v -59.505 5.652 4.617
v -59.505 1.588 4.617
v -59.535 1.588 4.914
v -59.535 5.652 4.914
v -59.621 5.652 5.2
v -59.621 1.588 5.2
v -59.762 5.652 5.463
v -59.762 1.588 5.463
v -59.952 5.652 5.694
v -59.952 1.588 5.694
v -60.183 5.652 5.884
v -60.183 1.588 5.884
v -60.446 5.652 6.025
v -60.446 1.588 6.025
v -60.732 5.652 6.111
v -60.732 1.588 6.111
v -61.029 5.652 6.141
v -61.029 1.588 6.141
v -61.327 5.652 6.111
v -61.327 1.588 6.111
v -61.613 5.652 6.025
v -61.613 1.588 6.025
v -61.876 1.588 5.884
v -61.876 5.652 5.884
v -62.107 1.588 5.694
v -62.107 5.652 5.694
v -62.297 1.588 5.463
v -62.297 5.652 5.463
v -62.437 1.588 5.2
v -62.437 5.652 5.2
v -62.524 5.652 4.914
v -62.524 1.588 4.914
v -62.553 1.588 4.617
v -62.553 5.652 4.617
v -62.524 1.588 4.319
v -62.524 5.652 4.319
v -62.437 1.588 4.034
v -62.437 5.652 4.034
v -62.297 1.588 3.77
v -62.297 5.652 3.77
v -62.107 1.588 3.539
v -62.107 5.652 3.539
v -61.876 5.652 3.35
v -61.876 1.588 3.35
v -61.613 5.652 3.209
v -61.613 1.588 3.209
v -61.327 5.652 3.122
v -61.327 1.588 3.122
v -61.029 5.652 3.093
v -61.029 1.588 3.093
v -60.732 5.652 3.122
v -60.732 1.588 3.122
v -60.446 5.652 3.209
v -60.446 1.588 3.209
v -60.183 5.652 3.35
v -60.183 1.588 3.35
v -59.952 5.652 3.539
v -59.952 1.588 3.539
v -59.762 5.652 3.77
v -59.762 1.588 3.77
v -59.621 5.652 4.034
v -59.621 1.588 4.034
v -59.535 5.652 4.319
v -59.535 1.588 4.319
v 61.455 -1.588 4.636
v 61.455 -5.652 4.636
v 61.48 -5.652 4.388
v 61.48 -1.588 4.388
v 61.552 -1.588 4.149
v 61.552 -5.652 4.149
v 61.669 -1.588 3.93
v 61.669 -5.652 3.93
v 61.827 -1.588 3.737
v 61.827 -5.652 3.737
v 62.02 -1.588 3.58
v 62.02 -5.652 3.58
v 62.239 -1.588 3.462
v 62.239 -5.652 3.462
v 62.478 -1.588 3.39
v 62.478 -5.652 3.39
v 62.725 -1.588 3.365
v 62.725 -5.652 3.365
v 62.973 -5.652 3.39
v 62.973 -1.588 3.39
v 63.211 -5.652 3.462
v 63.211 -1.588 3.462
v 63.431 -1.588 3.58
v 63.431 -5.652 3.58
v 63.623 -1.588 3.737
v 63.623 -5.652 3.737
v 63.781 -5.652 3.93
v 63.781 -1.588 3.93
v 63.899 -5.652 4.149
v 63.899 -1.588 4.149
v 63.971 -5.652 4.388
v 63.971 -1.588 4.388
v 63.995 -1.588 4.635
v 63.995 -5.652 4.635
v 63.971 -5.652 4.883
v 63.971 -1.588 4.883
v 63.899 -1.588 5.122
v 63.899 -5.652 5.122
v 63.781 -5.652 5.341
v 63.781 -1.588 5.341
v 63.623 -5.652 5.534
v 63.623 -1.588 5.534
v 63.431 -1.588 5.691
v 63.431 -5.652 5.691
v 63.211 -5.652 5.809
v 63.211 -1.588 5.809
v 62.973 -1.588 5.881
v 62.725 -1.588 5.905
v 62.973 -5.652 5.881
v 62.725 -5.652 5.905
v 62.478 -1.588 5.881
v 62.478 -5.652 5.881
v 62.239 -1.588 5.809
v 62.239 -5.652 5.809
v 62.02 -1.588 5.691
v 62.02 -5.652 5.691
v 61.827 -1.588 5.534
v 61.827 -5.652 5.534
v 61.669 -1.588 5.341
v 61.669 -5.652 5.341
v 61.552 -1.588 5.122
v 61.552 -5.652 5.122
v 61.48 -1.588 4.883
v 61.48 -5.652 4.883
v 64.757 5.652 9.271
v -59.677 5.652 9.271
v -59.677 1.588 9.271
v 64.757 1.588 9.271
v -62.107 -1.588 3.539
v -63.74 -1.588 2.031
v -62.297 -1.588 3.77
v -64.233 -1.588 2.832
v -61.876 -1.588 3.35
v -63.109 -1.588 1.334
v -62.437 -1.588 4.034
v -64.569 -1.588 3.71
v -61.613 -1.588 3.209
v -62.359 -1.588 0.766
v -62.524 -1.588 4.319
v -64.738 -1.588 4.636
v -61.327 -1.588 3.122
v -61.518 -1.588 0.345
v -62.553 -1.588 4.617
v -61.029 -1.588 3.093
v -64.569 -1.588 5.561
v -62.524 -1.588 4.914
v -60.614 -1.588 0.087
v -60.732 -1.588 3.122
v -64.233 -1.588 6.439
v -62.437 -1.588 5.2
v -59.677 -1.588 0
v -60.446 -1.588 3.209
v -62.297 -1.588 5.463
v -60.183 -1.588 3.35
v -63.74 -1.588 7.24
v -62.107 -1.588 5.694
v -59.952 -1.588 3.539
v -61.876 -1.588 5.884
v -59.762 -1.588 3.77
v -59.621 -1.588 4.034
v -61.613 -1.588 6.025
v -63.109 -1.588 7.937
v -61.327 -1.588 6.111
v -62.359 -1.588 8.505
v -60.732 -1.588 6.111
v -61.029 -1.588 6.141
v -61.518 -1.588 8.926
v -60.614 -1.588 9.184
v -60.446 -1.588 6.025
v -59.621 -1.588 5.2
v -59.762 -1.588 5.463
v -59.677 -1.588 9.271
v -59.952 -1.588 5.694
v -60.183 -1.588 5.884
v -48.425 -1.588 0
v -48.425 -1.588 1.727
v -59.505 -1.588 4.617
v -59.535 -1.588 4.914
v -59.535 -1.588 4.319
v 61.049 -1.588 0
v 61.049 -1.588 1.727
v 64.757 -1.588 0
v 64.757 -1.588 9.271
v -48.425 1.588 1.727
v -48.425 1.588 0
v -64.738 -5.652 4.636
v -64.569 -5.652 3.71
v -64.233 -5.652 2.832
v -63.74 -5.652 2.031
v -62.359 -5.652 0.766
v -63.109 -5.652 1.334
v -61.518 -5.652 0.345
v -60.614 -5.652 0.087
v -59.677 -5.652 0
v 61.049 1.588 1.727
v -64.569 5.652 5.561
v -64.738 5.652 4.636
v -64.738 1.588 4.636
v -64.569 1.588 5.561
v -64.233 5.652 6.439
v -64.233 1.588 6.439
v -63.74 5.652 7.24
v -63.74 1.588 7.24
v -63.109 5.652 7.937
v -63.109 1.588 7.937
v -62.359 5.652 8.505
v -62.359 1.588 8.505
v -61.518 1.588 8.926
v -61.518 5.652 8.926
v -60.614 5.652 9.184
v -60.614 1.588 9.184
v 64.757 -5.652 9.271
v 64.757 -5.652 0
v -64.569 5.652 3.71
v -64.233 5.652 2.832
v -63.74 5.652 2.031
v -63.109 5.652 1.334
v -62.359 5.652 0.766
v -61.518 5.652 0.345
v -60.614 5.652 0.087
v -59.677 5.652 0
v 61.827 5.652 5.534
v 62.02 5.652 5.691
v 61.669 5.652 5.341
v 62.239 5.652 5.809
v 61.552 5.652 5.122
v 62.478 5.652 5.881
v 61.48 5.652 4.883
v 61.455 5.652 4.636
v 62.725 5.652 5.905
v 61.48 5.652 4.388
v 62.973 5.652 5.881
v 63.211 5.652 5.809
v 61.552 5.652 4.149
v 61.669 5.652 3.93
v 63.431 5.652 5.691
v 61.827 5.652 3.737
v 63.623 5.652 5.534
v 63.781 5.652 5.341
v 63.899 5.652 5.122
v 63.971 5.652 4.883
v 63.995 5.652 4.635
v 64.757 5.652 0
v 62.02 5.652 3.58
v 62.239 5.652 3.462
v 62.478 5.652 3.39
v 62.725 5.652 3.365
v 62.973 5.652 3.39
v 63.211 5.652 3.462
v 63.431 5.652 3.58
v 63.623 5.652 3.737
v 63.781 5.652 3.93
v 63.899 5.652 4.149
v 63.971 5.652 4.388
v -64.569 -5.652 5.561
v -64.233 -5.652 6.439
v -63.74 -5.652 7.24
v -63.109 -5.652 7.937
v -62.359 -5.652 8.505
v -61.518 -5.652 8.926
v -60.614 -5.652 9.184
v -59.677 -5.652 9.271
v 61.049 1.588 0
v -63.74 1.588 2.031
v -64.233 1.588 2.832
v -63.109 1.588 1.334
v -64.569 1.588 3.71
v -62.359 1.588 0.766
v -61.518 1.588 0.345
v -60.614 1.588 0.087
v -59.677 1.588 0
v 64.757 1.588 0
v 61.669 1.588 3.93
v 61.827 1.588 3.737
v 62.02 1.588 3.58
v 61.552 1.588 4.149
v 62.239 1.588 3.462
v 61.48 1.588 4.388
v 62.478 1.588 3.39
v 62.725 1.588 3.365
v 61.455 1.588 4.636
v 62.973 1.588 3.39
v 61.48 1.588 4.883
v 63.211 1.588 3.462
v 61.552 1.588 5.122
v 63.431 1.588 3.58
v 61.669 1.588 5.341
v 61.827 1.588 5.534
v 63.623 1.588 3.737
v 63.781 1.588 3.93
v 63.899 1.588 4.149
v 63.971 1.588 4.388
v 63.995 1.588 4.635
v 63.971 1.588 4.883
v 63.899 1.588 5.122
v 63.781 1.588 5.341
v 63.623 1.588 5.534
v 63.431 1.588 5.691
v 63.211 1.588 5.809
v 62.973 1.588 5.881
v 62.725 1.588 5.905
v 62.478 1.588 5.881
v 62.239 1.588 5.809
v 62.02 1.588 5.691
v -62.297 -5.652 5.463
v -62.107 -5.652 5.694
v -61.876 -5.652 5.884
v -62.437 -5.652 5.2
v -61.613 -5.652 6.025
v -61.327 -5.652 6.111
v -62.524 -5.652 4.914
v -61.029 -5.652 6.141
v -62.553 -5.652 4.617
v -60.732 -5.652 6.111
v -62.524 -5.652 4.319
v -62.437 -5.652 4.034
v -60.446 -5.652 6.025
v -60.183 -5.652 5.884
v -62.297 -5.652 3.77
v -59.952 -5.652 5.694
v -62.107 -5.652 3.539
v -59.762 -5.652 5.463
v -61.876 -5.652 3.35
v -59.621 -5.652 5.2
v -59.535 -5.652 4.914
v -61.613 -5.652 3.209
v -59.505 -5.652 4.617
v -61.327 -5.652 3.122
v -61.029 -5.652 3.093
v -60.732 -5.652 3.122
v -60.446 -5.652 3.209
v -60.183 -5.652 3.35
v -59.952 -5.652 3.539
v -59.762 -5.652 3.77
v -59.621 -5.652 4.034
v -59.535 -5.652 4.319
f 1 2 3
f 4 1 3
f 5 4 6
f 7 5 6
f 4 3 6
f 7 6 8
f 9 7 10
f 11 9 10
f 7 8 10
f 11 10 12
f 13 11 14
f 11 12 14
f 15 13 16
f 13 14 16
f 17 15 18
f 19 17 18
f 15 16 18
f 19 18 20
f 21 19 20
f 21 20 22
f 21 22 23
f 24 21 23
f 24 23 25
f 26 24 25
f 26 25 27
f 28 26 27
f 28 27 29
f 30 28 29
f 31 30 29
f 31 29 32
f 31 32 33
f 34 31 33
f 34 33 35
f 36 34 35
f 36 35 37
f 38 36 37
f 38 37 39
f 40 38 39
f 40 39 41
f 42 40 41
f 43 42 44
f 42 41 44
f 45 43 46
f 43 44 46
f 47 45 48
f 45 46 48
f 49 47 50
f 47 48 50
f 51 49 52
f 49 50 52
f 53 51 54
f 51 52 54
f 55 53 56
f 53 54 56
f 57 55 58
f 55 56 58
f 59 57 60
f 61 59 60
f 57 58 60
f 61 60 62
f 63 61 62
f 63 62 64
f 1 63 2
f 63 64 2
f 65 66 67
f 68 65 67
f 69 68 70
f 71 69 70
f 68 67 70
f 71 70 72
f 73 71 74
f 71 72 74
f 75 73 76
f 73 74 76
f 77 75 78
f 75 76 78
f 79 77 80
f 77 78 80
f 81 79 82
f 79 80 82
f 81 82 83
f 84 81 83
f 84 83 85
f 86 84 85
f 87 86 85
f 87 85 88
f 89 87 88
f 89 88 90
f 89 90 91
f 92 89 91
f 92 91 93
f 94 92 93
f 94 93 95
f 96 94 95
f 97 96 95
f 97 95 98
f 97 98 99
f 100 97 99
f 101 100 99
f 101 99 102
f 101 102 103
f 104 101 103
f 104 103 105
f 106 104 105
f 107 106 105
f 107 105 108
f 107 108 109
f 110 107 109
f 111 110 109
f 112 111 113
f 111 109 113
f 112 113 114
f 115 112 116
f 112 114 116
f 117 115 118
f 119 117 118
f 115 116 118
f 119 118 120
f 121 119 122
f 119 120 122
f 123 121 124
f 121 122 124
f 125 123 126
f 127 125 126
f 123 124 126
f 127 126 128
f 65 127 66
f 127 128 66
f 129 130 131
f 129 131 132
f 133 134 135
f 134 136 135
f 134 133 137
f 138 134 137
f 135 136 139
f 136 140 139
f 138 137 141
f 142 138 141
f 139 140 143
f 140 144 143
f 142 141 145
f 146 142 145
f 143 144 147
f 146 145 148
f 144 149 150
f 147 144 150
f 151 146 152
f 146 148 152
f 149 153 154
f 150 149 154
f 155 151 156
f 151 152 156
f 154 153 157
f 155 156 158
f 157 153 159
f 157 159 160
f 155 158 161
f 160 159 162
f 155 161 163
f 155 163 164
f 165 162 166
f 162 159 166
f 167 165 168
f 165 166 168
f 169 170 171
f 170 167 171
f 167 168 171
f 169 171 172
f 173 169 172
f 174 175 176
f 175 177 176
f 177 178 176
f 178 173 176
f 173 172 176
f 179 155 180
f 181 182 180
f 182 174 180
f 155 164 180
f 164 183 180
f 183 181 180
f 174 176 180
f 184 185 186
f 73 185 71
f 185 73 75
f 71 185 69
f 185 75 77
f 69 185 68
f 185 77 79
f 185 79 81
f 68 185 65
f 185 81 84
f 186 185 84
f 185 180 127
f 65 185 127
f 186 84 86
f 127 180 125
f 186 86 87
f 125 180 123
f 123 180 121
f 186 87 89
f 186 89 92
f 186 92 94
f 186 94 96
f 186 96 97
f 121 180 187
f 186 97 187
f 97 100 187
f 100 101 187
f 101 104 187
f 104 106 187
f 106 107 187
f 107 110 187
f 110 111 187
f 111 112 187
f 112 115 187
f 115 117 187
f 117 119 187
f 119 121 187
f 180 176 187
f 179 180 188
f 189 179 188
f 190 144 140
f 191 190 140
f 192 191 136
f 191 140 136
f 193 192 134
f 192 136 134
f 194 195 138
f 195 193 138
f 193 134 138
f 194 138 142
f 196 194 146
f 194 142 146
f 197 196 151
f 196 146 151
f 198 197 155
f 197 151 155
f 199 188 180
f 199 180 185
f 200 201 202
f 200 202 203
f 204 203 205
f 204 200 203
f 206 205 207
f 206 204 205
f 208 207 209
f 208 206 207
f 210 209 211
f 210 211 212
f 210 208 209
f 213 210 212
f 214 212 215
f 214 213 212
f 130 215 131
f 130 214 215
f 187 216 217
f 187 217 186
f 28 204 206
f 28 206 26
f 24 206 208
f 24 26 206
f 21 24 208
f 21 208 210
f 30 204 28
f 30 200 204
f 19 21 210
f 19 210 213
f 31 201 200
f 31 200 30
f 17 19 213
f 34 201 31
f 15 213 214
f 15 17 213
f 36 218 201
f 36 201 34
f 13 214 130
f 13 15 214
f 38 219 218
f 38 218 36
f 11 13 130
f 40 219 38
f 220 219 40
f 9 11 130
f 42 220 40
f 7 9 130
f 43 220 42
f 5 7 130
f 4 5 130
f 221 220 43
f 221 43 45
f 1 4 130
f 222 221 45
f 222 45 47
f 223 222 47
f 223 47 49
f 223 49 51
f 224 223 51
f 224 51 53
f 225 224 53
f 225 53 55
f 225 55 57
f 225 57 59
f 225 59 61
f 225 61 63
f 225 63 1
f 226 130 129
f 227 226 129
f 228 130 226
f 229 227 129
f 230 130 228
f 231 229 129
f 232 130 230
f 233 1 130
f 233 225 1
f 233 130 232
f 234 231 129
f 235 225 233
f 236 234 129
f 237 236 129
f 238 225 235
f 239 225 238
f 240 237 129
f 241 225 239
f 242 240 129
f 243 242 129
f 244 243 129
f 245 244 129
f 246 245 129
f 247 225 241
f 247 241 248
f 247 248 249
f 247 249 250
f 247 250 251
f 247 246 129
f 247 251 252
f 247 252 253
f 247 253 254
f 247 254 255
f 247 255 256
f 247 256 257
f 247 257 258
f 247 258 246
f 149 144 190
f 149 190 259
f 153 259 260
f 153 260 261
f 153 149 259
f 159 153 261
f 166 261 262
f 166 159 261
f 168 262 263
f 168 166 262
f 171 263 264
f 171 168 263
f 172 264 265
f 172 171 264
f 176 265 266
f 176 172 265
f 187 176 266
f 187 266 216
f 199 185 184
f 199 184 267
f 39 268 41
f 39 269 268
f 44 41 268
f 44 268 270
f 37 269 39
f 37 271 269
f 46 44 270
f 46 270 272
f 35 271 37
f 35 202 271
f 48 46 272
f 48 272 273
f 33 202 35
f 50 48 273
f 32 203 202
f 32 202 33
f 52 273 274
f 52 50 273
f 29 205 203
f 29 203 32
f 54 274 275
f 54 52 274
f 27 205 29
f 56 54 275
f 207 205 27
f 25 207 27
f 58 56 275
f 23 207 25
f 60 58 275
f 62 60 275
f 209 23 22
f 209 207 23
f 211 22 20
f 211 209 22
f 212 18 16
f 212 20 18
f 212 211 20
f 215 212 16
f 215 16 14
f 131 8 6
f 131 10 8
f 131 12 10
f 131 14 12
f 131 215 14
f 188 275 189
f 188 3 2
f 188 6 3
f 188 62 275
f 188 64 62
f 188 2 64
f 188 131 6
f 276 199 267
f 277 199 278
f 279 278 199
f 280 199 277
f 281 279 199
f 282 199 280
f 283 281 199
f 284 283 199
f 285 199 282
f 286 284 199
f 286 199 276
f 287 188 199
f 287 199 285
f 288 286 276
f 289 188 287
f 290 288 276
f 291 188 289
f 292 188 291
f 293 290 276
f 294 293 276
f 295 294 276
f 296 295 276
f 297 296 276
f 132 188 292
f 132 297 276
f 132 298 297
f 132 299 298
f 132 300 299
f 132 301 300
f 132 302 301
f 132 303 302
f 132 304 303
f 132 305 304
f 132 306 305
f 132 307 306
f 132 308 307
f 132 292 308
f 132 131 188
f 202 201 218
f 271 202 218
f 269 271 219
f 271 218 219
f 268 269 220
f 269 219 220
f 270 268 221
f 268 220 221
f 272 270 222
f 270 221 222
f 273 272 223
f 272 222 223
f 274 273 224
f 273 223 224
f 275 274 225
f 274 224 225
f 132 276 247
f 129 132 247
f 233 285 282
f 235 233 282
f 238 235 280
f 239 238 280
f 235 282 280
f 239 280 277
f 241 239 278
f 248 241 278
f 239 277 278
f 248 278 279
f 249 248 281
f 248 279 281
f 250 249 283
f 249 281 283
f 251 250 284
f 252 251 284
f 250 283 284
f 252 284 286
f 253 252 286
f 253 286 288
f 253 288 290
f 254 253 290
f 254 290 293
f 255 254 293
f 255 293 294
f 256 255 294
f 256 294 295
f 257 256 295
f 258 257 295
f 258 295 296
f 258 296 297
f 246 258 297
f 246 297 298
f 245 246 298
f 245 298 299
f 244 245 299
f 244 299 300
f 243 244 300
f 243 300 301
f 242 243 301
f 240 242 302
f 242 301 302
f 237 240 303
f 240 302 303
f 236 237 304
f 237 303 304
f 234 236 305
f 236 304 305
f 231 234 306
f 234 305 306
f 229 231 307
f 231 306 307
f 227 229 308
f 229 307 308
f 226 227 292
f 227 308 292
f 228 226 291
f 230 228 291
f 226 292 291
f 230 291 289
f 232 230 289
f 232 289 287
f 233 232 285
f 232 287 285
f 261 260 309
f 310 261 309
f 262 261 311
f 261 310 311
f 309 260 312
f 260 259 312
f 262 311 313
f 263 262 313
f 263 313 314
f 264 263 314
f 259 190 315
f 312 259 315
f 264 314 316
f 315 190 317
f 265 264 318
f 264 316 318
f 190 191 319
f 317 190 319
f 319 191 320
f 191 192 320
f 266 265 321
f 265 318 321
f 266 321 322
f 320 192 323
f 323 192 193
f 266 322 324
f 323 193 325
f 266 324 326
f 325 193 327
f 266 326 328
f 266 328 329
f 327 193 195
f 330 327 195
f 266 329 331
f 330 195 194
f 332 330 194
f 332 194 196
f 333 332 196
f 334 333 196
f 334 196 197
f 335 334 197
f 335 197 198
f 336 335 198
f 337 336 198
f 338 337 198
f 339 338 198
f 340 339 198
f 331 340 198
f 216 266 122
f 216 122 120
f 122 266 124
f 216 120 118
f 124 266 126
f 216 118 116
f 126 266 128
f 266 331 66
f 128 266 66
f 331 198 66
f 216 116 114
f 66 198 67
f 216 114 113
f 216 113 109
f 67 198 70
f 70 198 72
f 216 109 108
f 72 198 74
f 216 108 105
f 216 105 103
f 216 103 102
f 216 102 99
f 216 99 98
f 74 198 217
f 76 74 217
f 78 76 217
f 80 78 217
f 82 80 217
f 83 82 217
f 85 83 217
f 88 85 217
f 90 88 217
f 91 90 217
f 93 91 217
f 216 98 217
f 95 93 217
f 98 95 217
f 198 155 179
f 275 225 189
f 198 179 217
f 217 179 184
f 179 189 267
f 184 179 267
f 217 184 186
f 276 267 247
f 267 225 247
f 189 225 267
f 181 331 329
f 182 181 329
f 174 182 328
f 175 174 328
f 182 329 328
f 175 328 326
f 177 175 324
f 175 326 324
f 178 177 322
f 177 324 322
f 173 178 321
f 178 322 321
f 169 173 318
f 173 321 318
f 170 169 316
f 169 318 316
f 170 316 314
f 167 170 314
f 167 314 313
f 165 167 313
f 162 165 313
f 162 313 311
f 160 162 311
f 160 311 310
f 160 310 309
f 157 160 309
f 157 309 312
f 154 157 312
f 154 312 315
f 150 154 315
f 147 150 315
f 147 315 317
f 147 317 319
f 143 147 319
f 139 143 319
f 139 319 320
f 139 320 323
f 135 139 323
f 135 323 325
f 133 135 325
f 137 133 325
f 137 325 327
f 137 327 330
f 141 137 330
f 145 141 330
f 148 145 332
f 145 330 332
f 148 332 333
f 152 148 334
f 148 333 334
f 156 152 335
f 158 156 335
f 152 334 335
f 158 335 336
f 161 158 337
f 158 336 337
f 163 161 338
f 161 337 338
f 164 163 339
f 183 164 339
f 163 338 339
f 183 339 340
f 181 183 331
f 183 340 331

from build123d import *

# Parameters (mm, degrees)
F0_W        = 129.5146
F0_H        = 11.303
F1_DEPTH    = 9.271
F2_W        = 206.3660303733
F2_H        = 3.175
F3_DEPTH    = 7.5438
F4_W        = 3.7084
F4_H        = 3.175
F5_DEPTH    = 25.4
F6_W        = 16.3322
F6_H        = 3.175
F7_DEPTH    = 25.4
F8_T1_DEPTH = 29.464
F8_T3_DEPTH = 29.464
F9_R        = 1.524
F10_DEPTH   = 25.4
F12_DEPTH   = 25.4
F13_W       = 11.2141259015
F13_H       = 1.2269735361
F14_DEPTH   = 4.1656
F15_DEPTH   = 0.254
F16_DEPTH   = 3.175
F16_FACE_W  = 4.4019735361
F16_FACE_H  = 4.1656
F17_ANGLE   = 90


# Not quite as in the source:
# - a fillet or chamfer that OpenCascade refuses, or shapes differently, is made with other operations: its cross-section is extruded or revolved along the edge and cut away or added


with BuildPart() as f1:
    # F0 (on Top) → F1 (new body)
    with BuildSketch(Plane.XY):
        Rectangle(F0_W, F0_H)
    extrude(amount=F1_DEPTH)

    # F2 (on face) → F3 (cut)
    with BuildSketch(Plane.XY.offset(9.271)):
        Rectangle(F2_W, F2_H)
    extrude(amount=-F3_DEPTH, mode=Mode.SUBTRACT)

    # F4 (on face) → F5 (cut)
    with BuildSketch(Plane.XY.offset(1.7272)):
        with Locations((62.9031, 0)):
            Rectangle(F4_W, F4_H)
    extrude(amount=-F5_DEPTH, mode=Mode.SUBTRACT)

    # F6 (on face) → F7 (cut)
    with BuildSketch(Plane.XY.offset(1.7272)):
        with Locations((-56.5912, 0)):
            Rectangle(F6_W, F6_H)
    extrude(amount=-F7_DEPTH, mode=Mode.SUBTRACT)

    # F8: fillet of radius 5.08 on 4 edges, made by hand

    # F8_s2 → F8_t1 (cut)
    with BuildSketch(Plane.XZ.offset(-11.1125)):
        with BuildLine():
            ThreePointArc((-64.7573, 4.191), (-63.2694024484, 7.7831024484), (-59.6773, 9.271))
            Line((-59.6773, 9.271), (-64.7573, 9.271))
            Line((-64.7573, 9.271), (-64.7573, 4.191))
        make_face()
        with BuildLine():
            ThreePointArc((-64.7573, 5.08), (-63.2694024484, 1.4878975516), (-59.6773, 0))
            Line((-59.6773, 0), (-64.7573, 0))
            Line((-64.7573, 0), (-64.7573, 5.08))
        make_face()
    extrude(amount=F8_T1_DEPTH, mode=Mode.SUBTRACT)

    # F8_s4 → F8_t3 (cut)
    with BuildSketch(Plane.XZ.offset(-18.3515)):
        with BuildLine():
            ThreePointArc((-59.6773, 9.271), (-63.2694024484, 7.7831024484), (-64.7573, 4.191))
            Line((-64.7573, 4.191), (-64.7573, 9.271))
            Line((-64.7573, 9.271), (-59.6773, 9.271))
        make_face()
        with BuildLine():
            ThreePointArc((-64.7573, 5.08), (-63.2694024484, 1.4878975516), (-59.6773, 0))
            Line((-59.6773, 0), (-64.7573, 0))
            Line((-64.7573, 0), (-64.7573, 5.08))
        make_face()
    extrude(amount=F8_T3_DEPTH, mode=Mode.SUBTRACT)

    # F9 (on face) → F10 (cut)
    with BuildSketch(Plane.XZ.offset(5.6515)):
        with Locations((-61.0294157593, 4.6167229302)):
            Circle(F9_R)
    extrude(amount=-F10_DEPTH, mode=Mode.SUBTRACT)

    # F11 (on face) → F12 (cut)
    with BuildSketch(Plane.XZ.offset(5.6515)):
        with BuildLine():
            Line((61.4553, 4.6355), (63.9953, 4.6355))
            ThreePointArc((63.9953, 4.6355), (62.7253, 5.9055), (61.4553, 4.6355))
        make_face()
        with BuildLine():
            ThreePointArc((61.4553, 4.6355), (62.7253, 3.3655), (63.9953, 4.6355))
            Line((63.9953, 4.6355), (61.4553, 4.6355))
        make_face()
    extrude(amount=-F12_DEPTH, mode=Mode.SUBTRACT)


with BuildPart() as f14:
    # F13 (on Top) → F14 (new body)
    with BuildSketch(Plane.XY):
        with Locations((67.7984524518, -0.613486768)):
            Rectangle(F13_W, F13_H)
    extrude(amount=F14_DEPTH)


with BuildPart() as f15:
    # F15 (new): a face of the model
    f15_faces = [f14.part.faces().sort_by_distance(p)[0] for p in [
        (73.4055154026, -0.613486768, 2.0828),
    ]]
    extrude(f15_faces, amount=F15_DEPTH)


with BuildPart() as f14_1:
    add(f14.part)

    # F16 (add): a face of the model
    f16_faces = [f15.part.faces().sort_by_distance(p)[0] for p in [
        (73.5325154026, -1.2269735361, 2.0828),
    ]]

    add(f15.part)  # F16 merges F15
    extrude(f16_faces, amount=F16_DEPTH)


with BuildPart() as f17:
    # F16_face (on face) → F17 (revolve)
    with BuildSketch(Plane(origin=(73.6595154026, -2.200986768, 2.0828), x_dir=(0, 1, 0), z_dir=(1, 0, 0))):
        Rectangle(F16_FACE_W, F16_FACE_H)
    revolve(axis=Axis((73.6595154026, -2.200986768, 0), (0, -1, 0)), revolution_arc=F17_ANGLE)


with BuildPart() as f18_1:
    # F18: instance of F14
    add(f14_1.part.mirror(Plane.XZ))


with BuildPart() as f18_2:
    # F18: instance of F17
    add(f17.part.mirror(Plane.XZ))


solid = f1.part
